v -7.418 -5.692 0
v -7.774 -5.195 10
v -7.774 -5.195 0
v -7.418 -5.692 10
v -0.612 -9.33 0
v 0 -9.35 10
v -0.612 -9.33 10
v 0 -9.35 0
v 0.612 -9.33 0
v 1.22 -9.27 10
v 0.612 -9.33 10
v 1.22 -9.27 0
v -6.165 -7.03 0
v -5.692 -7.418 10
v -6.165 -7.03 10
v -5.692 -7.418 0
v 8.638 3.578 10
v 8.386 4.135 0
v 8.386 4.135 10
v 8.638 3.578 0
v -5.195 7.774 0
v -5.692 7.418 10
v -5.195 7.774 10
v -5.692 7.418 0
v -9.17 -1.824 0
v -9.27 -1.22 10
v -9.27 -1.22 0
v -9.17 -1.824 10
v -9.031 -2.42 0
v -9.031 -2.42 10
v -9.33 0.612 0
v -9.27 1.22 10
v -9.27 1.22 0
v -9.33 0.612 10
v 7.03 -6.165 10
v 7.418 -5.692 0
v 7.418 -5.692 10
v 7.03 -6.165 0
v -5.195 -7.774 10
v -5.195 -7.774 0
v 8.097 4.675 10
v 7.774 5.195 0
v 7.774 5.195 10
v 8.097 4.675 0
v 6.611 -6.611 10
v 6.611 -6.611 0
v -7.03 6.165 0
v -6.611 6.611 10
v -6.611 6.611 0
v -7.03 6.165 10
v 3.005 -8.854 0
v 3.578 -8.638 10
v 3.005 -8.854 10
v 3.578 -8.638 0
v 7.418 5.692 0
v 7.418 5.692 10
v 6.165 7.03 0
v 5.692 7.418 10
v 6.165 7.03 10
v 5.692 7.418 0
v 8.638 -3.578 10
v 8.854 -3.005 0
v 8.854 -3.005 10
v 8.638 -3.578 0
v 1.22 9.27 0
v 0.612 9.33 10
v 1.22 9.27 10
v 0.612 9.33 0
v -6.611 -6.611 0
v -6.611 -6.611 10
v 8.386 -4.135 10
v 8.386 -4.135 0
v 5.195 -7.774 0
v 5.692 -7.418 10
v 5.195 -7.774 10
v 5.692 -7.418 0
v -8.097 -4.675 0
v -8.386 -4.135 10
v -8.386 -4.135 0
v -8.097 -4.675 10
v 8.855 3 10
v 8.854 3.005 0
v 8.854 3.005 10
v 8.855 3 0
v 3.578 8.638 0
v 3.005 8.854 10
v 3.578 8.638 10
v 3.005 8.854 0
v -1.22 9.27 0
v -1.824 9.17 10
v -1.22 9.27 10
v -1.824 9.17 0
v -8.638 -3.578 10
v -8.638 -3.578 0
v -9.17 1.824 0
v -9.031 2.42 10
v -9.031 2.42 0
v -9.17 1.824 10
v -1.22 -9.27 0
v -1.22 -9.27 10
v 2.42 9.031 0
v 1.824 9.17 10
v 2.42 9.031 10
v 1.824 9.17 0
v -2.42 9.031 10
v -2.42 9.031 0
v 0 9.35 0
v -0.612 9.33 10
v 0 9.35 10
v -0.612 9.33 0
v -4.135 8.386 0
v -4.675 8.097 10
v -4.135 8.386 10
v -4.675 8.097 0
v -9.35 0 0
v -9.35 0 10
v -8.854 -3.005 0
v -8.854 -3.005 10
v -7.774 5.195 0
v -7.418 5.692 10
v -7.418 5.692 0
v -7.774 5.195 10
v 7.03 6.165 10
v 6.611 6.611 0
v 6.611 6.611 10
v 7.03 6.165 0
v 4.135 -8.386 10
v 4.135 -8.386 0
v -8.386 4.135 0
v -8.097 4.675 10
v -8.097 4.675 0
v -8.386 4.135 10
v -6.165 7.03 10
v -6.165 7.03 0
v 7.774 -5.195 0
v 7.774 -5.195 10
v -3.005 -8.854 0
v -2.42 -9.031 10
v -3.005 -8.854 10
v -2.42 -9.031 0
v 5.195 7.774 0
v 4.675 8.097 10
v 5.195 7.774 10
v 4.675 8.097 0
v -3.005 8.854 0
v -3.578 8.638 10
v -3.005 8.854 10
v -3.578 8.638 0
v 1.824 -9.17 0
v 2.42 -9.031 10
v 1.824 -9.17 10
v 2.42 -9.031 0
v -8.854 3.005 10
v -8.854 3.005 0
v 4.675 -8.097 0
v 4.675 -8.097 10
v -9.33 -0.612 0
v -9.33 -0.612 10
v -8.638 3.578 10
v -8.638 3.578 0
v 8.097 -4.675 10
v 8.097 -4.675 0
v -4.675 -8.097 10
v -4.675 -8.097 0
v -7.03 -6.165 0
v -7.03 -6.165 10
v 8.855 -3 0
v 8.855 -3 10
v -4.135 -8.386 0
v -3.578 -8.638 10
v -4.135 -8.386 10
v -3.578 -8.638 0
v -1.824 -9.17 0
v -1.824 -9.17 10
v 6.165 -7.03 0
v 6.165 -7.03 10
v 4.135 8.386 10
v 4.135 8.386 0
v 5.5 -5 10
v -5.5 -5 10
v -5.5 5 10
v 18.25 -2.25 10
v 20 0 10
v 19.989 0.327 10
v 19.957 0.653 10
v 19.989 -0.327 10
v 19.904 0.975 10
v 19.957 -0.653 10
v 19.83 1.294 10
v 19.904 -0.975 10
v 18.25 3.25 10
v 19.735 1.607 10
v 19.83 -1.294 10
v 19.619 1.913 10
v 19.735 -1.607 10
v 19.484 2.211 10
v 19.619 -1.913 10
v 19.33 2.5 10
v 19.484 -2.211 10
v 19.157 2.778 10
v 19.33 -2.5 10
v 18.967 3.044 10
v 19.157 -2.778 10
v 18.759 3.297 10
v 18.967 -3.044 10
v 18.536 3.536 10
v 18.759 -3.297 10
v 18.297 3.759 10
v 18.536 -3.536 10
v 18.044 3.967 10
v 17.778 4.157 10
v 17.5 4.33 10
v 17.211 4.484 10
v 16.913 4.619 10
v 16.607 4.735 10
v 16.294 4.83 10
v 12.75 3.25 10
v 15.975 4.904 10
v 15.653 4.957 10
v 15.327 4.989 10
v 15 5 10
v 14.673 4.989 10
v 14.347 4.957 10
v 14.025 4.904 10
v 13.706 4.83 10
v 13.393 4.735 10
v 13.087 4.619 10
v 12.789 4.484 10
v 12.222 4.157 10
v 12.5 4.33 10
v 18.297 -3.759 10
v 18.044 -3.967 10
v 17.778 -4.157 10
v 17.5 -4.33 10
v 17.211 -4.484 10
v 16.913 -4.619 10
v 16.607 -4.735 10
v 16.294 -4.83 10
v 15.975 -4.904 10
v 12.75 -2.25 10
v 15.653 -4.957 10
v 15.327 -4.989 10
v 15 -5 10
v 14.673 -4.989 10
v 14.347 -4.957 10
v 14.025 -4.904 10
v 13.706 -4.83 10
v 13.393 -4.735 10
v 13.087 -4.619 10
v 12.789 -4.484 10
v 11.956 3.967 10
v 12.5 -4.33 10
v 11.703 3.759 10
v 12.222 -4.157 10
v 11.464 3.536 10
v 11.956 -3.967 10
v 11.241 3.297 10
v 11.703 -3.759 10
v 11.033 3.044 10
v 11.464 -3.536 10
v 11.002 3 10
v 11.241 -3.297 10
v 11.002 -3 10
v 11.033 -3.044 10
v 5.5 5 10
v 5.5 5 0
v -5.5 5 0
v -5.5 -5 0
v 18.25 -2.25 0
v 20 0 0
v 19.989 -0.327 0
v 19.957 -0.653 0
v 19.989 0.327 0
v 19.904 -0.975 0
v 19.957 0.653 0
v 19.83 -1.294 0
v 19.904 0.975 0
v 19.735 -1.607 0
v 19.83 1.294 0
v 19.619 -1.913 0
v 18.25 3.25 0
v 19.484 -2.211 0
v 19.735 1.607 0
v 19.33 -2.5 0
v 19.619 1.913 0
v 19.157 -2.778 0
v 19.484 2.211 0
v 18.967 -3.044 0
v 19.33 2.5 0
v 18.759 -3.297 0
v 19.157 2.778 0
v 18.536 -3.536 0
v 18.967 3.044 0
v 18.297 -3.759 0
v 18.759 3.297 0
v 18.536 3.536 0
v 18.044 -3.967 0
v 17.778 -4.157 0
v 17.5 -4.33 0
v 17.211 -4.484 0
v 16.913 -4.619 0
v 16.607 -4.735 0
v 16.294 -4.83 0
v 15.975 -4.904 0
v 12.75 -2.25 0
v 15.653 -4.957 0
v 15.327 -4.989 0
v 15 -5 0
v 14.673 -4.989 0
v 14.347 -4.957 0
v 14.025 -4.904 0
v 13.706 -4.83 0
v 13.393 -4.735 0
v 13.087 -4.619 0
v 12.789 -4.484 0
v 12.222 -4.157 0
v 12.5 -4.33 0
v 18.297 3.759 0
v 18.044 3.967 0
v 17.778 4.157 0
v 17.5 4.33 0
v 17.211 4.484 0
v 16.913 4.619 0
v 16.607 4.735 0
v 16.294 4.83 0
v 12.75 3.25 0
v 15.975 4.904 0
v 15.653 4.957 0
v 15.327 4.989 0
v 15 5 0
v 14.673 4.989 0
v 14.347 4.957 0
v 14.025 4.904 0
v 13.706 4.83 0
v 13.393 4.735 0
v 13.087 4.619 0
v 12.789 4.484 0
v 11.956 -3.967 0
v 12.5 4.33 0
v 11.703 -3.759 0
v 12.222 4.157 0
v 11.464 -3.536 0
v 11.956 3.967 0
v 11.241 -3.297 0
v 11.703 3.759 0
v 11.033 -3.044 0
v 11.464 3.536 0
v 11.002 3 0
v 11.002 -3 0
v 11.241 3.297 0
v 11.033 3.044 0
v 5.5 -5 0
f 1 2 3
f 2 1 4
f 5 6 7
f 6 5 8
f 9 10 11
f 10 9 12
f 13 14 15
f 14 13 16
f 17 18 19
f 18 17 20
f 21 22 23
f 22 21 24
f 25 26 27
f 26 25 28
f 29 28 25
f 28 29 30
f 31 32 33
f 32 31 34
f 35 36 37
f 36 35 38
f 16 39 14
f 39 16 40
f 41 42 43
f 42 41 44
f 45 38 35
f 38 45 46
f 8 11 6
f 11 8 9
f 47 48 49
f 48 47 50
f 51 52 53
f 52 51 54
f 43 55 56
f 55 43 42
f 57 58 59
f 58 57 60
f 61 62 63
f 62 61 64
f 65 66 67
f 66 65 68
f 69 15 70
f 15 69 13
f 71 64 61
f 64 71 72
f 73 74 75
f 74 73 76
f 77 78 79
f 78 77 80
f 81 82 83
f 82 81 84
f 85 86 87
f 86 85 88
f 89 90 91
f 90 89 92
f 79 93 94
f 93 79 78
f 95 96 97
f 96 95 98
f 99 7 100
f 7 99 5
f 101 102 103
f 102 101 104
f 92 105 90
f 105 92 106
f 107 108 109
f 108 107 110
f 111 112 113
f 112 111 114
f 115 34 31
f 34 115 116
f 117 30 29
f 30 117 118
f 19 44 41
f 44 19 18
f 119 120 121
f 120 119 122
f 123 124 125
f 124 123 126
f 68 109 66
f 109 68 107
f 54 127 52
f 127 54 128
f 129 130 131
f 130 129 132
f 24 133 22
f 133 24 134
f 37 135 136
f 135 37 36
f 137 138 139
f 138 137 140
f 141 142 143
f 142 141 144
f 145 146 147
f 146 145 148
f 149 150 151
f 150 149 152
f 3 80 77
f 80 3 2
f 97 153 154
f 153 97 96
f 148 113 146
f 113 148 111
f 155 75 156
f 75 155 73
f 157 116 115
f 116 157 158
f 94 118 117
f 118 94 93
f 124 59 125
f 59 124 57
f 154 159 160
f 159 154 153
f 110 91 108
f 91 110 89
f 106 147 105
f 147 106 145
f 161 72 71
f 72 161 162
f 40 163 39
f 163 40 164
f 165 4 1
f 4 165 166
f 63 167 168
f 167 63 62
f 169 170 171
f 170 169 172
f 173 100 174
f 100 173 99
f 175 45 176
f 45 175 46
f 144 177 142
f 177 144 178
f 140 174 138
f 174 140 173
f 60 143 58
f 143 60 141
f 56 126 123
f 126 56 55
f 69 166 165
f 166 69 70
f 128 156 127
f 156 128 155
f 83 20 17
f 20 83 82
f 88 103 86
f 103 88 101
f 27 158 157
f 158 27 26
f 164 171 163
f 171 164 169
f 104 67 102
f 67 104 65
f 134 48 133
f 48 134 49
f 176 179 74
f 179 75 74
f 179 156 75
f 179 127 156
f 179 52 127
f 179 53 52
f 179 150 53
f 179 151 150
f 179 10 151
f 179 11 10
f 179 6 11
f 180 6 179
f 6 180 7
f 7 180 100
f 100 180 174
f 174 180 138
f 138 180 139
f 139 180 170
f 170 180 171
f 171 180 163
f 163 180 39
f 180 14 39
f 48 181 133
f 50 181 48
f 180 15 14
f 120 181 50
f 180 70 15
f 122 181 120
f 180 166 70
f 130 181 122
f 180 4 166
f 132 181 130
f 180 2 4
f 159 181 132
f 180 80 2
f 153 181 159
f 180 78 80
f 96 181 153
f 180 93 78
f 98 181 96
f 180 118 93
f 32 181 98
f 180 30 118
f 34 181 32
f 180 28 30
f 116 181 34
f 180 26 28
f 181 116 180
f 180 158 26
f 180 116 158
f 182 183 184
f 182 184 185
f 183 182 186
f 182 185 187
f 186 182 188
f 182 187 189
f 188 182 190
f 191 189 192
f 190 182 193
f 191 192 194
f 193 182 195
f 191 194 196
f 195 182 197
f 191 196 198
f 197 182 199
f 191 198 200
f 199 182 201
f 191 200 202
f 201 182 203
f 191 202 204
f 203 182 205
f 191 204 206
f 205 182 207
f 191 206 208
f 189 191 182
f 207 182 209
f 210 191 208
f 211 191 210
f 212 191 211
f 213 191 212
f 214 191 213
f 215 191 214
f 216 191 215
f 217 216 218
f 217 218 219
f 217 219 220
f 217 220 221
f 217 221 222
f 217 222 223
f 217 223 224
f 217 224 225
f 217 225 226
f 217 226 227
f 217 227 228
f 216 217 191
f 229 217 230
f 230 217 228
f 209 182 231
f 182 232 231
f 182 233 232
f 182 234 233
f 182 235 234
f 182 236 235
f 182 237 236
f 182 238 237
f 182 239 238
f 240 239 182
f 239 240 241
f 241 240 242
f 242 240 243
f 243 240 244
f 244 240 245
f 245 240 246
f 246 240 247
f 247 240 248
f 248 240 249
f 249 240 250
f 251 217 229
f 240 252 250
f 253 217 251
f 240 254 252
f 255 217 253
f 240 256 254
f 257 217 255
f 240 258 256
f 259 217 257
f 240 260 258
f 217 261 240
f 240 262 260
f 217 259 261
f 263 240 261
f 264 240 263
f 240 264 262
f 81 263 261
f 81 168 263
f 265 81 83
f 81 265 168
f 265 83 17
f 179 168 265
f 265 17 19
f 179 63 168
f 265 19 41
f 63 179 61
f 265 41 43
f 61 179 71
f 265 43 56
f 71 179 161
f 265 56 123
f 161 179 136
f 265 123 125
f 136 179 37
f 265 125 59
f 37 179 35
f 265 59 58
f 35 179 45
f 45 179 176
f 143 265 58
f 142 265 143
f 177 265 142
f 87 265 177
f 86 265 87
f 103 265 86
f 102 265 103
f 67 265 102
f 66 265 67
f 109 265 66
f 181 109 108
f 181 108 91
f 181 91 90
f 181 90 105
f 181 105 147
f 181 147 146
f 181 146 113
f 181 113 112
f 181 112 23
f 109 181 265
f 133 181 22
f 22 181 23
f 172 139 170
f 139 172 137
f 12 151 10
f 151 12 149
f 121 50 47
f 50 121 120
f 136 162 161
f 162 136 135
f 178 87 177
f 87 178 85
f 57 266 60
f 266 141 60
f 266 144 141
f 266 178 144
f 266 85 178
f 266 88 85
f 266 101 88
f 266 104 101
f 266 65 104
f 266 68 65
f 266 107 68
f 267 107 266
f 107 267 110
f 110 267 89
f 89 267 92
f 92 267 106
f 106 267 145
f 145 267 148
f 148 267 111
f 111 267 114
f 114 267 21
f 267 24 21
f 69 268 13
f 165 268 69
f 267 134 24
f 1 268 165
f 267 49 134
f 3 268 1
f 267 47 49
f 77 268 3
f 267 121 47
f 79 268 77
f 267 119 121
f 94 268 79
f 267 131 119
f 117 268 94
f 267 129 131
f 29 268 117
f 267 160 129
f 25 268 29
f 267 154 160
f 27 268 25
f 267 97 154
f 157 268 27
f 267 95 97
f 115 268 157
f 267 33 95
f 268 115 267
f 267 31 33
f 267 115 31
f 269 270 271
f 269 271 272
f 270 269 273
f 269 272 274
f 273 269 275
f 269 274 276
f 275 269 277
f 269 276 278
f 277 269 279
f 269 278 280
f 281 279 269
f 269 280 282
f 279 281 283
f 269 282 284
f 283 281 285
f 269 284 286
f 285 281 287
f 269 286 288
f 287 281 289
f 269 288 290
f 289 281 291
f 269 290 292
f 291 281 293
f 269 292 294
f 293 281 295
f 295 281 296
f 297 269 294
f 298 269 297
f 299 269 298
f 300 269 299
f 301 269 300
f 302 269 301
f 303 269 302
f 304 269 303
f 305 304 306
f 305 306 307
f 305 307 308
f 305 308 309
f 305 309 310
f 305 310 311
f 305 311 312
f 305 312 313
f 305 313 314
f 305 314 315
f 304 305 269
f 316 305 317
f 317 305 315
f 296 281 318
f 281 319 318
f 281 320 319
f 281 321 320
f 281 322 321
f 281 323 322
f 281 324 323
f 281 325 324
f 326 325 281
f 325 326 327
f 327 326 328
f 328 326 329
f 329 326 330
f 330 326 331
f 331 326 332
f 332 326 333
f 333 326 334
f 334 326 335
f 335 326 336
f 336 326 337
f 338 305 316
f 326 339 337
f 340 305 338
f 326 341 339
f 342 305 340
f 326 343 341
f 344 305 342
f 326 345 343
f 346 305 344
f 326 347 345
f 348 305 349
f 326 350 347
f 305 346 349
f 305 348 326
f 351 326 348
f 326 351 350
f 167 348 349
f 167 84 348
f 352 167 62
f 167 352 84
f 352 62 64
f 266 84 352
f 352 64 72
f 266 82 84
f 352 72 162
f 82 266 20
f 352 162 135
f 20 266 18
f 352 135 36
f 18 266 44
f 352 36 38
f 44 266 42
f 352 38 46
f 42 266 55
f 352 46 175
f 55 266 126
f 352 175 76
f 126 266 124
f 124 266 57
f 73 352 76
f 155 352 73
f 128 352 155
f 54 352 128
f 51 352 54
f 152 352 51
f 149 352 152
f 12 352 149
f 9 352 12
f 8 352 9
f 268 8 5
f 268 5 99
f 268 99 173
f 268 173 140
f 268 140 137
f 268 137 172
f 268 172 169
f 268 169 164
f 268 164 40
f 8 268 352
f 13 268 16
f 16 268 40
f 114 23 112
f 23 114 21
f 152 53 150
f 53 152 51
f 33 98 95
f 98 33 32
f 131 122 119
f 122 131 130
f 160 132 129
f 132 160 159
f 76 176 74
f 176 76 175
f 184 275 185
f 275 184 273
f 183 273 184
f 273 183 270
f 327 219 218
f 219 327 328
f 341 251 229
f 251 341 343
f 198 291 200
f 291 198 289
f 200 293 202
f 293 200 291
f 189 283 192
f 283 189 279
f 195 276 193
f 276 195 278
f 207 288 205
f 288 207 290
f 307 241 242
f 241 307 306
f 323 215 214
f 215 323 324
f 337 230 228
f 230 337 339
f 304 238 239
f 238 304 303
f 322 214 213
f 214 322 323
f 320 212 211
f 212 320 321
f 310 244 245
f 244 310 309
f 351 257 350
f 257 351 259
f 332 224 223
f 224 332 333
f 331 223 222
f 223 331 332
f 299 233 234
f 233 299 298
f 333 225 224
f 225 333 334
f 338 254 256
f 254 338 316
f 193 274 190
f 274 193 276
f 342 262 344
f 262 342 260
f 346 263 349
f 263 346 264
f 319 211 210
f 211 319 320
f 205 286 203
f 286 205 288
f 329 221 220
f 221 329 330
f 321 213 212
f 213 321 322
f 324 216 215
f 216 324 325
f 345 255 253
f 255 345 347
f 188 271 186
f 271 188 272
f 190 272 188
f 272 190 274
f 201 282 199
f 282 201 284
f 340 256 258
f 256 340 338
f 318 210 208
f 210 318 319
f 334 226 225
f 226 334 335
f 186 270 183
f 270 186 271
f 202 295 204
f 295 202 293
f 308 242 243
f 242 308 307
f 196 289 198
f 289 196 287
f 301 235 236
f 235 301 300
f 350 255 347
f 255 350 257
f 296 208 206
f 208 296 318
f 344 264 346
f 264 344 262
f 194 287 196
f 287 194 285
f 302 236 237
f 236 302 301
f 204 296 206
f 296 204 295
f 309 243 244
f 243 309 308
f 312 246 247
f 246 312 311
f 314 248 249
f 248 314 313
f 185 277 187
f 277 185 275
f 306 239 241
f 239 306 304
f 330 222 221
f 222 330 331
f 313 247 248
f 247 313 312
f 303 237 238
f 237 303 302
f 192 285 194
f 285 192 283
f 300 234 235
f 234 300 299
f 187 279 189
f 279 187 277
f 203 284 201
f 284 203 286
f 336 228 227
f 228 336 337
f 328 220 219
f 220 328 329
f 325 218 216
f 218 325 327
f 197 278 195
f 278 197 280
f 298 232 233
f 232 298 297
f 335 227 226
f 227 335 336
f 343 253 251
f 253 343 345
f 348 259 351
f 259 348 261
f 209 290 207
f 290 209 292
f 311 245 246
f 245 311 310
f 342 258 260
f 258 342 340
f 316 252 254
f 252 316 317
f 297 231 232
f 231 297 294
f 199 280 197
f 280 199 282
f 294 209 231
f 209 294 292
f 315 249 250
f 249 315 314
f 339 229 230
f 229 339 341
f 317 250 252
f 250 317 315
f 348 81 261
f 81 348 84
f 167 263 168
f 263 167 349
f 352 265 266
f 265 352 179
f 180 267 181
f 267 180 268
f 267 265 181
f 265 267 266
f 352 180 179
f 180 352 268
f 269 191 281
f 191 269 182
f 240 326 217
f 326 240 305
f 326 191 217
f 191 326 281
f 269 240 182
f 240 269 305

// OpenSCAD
// Stand rod and tubing clip - printed flat, 10 mm tall extrusion
// Units: mm. Snap-on ring for a 12.7 mm (1/2") lab stand rod and a
// 6 mm inner-diameter tubing ring, joined by a solid bridge.

$fn = 96;

// ---- Dimensions ----
extrusion_height   = 10;     // Z height of the 2-D profile
stand_d            = 12.7;   // stand rod diameter
stand_wall         = 3;      // stand ring wall thickness
stand_outer        = stand_d + 2 * stand_wall; // 18.7 mm
stand_opening_w    = 10;     // width of the -X side cutout
tubing_d           = 6;      // tubing ring inner diameter
tubing_wall        = 2;      // tubing ring wall thickness
tubing_opening_w   = 4.5;    // width of the +X side cutout
bridge_x0          = 8;      // bridge start (X)
bridge_x1          = 12;     // bridge end (X)
bridge_y           = 6;      // bridge width (Y)

// ---- Cutting overlap ----
eps = 0.5;   // extension past cut faces to avoid coplanar faces

// ---- Model ----
difference() {
    union() {
        // Stand ring, centred at origin
        cylinder(d = stand_outer, h = extrusion_height);
        // Tubing ring, centred at x = 15, y = 0
        translate([15, 0, 0])
            cylinder(d = tubing_d + 2 * tubing_wall, h = extrusion_height);
        // Solid bridge between x = 8 and x = 12
        translate([bridge_x0, -bridge_y / 2, 0])
            cube([bridge_x1 - bridge_x0, bridge_y, extrusion_height]);
    }
    // Stand opening: x < 0, -5 < y < 5
    translate([-stand_opening_w / 2 - eps, -5, 0])
        cube([stand_opening_w + 2 * eps, 10, extrusion_height + eps]);
    // Tubing opening: x > 15, -2.25 < y < 2.25
    translate([15 - tubing_opening_w / 2, -tubing_opening_w / 2, 0])
        cube([tubing_opening_w + 2 * eps, tubing_opening_w + 2 * eps,
               extrusion_height + eps]);
}
